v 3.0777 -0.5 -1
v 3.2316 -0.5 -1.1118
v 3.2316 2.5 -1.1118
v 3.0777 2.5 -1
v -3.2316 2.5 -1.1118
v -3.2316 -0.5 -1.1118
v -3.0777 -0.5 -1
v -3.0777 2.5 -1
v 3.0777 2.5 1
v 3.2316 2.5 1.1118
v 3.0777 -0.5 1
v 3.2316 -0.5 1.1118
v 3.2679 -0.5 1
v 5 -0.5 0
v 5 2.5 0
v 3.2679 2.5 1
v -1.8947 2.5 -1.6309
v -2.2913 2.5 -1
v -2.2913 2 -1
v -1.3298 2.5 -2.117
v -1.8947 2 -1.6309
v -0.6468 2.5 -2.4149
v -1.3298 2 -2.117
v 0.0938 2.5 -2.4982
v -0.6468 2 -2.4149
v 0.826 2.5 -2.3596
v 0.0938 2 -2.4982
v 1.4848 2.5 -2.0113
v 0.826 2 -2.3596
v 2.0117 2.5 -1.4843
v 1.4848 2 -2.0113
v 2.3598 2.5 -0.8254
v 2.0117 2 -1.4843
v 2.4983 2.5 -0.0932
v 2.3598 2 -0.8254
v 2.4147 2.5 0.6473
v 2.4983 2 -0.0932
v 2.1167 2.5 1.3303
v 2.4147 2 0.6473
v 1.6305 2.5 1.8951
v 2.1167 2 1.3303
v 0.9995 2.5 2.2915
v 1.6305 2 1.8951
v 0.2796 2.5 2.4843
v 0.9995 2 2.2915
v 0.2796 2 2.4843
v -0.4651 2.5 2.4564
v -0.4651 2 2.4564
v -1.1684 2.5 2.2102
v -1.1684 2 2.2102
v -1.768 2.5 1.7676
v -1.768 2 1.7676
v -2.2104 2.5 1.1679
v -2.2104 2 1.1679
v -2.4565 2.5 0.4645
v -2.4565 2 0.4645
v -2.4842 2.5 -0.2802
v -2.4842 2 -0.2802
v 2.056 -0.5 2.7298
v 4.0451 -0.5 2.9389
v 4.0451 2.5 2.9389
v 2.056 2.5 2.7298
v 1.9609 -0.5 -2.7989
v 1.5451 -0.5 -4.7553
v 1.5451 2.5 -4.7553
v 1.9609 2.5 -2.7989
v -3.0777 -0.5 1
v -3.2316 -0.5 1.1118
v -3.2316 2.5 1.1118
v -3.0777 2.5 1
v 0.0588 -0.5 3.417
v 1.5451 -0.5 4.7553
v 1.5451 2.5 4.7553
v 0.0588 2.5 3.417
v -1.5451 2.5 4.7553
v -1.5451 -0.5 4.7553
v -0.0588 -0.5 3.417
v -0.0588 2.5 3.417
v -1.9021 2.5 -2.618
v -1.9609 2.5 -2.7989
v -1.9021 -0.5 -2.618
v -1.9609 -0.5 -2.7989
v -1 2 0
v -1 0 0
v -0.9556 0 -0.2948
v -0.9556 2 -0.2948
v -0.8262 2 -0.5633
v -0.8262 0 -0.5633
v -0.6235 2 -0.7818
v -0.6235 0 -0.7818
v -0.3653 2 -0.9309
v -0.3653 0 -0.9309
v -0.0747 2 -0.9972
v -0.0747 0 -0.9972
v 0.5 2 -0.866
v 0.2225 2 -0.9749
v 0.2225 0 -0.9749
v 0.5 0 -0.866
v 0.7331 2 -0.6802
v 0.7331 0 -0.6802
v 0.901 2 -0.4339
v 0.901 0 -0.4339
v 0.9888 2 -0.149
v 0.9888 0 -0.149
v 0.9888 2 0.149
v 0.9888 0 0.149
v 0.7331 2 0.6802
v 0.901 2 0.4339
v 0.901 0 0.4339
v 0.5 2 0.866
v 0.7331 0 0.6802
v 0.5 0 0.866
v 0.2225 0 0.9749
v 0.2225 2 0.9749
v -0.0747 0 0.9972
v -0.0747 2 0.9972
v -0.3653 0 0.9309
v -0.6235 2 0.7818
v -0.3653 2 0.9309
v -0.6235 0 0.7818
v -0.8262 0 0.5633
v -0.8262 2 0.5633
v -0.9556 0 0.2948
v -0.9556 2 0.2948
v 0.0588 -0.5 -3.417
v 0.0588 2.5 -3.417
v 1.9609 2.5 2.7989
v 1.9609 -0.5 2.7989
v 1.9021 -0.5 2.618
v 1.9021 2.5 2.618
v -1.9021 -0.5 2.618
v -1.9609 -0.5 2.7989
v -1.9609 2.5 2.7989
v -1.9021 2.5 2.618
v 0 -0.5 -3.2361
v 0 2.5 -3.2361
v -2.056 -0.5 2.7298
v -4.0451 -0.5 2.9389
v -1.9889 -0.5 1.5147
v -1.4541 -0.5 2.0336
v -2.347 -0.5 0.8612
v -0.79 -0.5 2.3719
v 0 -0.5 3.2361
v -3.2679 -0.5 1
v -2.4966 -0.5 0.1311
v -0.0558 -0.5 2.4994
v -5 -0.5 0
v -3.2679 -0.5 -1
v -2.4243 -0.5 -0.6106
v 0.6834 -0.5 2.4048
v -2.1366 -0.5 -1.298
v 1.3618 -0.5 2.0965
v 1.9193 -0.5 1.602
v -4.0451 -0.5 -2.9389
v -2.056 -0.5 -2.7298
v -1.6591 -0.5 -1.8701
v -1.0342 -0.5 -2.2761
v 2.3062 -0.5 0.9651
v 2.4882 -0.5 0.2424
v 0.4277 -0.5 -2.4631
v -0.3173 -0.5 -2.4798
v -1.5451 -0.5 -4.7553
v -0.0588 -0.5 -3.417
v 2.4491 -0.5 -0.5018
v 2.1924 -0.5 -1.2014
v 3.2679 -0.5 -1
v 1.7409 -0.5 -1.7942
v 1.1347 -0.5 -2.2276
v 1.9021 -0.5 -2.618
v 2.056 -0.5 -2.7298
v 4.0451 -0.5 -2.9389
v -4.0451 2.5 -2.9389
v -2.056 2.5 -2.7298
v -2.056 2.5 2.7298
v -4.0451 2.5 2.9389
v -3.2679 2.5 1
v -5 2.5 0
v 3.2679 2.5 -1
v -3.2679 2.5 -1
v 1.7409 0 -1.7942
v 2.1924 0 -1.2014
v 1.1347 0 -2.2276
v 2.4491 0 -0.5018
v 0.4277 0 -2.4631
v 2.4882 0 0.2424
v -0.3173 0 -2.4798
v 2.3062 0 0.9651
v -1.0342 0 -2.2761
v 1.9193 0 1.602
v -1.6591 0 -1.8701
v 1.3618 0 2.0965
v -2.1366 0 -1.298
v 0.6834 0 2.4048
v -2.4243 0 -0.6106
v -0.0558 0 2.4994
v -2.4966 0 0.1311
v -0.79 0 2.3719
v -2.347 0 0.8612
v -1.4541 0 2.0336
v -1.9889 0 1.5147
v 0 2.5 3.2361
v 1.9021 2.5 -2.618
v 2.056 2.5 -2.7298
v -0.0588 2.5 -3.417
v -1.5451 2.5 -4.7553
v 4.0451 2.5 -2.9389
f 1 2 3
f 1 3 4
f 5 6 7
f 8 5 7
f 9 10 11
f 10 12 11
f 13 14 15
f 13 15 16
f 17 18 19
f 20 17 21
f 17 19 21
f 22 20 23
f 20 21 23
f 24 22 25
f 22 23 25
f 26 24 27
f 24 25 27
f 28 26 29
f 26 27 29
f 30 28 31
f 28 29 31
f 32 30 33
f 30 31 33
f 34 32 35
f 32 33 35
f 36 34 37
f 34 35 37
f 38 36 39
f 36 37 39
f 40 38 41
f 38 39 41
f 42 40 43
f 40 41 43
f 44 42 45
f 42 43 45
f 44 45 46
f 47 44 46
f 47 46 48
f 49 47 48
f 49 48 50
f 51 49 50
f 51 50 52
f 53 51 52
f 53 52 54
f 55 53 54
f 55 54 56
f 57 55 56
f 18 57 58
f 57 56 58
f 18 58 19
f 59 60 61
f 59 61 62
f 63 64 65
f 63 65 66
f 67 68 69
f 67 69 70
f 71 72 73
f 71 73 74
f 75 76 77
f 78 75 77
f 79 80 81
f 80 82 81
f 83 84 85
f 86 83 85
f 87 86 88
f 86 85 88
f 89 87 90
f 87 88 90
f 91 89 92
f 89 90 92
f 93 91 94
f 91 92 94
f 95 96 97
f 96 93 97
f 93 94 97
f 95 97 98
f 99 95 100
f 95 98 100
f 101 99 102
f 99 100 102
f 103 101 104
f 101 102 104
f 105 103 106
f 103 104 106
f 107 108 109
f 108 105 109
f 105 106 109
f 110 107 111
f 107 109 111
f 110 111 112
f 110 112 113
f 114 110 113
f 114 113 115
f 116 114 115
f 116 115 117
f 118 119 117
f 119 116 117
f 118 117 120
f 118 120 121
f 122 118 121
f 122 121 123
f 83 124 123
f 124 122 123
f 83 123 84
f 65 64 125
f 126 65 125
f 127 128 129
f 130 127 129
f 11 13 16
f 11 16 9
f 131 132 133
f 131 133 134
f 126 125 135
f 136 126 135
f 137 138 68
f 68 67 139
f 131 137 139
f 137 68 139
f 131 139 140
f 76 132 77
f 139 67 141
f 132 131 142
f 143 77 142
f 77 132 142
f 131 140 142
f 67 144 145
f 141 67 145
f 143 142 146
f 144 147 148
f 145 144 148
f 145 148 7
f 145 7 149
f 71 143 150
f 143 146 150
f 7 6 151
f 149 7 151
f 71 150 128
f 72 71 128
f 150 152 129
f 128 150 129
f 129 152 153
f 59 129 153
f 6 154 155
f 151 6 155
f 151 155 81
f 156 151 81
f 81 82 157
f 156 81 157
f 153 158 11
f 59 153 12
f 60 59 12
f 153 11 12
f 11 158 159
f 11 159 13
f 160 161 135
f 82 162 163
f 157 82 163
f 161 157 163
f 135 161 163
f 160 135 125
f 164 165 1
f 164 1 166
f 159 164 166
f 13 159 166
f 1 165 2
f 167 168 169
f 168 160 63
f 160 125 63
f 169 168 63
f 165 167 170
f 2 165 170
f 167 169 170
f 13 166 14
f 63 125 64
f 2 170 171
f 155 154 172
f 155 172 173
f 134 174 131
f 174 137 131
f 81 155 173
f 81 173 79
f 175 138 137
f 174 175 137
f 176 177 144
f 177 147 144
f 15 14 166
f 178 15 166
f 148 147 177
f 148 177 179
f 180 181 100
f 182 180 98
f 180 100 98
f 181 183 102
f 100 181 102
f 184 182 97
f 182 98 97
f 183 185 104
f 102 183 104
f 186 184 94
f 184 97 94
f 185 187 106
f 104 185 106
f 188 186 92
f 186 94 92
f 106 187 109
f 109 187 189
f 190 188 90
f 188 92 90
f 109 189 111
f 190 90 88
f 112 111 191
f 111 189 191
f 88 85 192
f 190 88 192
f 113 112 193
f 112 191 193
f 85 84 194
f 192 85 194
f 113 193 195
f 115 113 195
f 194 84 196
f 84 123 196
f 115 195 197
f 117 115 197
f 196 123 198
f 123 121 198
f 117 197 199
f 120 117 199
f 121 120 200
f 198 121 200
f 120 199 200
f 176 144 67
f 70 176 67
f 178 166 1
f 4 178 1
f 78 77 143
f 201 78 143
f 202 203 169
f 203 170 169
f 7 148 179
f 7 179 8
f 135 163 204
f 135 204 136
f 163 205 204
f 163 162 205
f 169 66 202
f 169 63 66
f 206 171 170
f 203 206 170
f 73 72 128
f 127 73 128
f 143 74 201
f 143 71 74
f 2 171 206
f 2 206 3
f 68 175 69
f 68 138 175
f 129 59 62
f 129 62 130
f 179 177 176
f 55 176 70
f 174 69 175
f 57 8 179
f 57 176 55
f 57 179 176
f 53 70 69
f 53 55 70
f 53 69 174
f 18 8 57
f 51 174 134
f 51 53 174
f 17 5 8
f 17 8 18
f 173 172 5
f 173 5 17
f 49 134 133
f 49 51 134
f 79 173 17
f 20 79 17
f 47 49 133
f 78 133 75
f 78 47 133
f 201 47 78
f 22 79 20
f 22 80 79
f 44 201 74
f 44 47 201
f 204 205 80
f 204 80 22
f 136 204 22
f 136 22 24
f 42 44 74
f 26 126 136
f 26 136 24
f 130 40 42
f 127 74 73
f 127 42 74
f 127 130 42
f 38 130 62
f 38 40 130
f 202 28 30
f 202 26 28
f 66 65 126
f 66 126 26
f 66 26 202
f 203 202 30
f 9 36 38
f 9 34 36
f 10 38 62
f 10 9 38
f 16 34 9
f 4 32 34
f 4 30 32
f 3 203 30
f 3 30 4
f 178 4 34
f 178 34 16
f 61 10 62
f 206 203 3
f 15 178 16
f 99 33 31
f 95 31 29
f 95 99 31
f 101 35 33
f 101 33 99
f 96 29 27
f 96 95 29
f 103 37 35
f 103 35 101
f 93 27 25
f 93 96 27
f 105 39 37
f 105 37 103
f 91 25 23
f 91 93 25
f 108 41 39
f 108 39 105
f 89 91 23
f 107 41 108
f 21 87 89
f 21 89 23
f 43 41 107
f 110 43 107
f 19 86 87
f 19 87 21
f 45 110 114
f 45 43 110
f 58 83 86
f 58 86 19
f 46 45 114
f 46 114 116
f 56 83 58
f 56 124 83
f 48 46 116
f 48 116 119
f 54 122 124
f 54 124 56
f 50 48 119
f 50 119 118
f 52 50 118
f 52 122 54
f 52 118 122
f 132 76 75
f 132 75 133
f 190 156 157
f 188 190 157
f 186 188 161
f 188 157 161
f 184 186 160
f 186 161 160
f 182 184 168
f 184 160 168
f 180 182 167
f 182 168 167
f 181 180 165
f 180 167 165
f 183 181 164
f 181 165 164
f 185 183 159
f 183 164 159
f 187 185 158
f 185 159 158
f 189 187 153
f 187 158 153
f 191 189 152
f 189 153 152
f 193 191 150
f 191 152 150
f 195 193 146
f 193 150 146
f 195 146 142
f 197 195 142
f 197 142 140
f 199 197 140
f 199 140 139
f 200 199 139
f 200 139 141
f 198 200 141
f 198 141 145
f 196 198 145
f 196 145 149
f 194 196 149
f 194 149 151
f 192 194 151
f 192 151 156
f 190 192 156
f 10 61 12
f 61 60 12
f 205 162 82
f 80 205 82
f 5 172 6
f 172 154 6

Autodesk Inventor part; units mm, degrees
ref_plane "YZ Plane" through (0, 0, 0) normal (1, 0, 0) x (0, 1, 0)
ref_plane "XZ Plane" through (0, 0, 0) normal (0, 1, 0) x (-1, 0, 0)
ref_plane "XY Plane" through (0, 0, 0) normal (0, 0, 1) x (1, 0, 0)
sketch "Sketch1" plane through (0, 0, 0) normal (0, 1, 0) x (-1, 0, 0)
  circle A0 centre (0, 0) radius 25
  circle A1 centre (0, 0) radius 22.5
  circle A2 centre (0, 0) radius 2.25
  line L0 (10, 10) -> (-10, 10)
  line L1 (-10, 10) -> (-10, -10)
  line L2 (-10, -10) -> (10, -10)
  line L3 (10, -10) -> (10, 10)
  line L4 (10, 10) -> (-10, -10) construction
  line L5 (-10, 10) -> (10, -10) construction
  circle A3 centre (10, -10) radius 2.5
  circle A4 centre (-10, -10) radius 2.5
  circle A5 centre (-10, 10) radius 2.5
  circle A6 centre (10, 10) radius 2.5
  circle A7 centre (0, 0) radius 5
  circle A8 centre (0, 0) radius 2.5
  circle A9 centre (0, 0) radius 1
  dimension "d0" = 50
  dimension "d1" = 45
  dimension "d2" = 4.5
  dimension "d3" = 20
  dimension "d4" = 20
  dimension "d5" = 5
  dimension "d6" = 5
  dimension "d7" = 5
  dimension "d8" = 5
  dimension "d27" = 10
  dimension "d28" = 5
  dimension "d29" = 2
extrude "Extrusion1" add sketch "Sketch1" along normal blind 2 contours A2 | A8
sketch "Sketch5" plane through (0, 2, 0) normal (0, 1, 0) x (1, 0, 0)
  circle A0 centre (0, 0) radius 5
  line L0 (-5, 0) -> (-3.2679, 1)
  line L1 (-5, 0) -> (-3, 0) construction
  line L2 (-3.2679, 1) -> (-2.2913, 1)
  circle A1 centre (0, 0) radius 2.5 projected
  line L3 (-5, 0) -> (-3.2679, -1)
  line L4 (-5, 0) -> (-3, 0) construction
  line L5 (-3.2679, -1) -> (-2.2913, -1)
  dimension "d30" = 10
  dimension "d31" = 2
  dimension "d32" = 30
  dimension "d33" = 2
  dimension "d34" = 30
extrude "Extrusion4" add sketch "Sketch5" along normal blind 0.5 and the other way blind 2.5 contours L0 L2 A1 L5 L3
pattern_circular "Circular Pattern2" count 10 over 360 about axis through (0, 0, 0) along (0, 1, 0) of "Extrusion4"
sketch "Sketch6" plane through (0, 2, 0) normal (0, 1, 0) x (1, 0, 0)
  line L0 (1.5451, 4.7553) -> (1.9609, 2.799) projected
  circle A0 centre (0, 0) radius 5
equation "\"BendRadius\" = Thickness"
equation "\"BendReliefWidth\" = Thickness"
equation "\"BendReliefDepth\" = 0.5 * Thickness"
equation "\"CornerReliefSize\" = 4 * Thickness"
equation "\"MinimumRemnant\" = 2 * Thickness"
equation "\"TransitionRadius\" = BendRadius"
equation "\"JacobiRadiusSize\" = BendRadius"
equation "\"GapSize\" = Thickness"
equation "\"Thickness\" = 0.5"
